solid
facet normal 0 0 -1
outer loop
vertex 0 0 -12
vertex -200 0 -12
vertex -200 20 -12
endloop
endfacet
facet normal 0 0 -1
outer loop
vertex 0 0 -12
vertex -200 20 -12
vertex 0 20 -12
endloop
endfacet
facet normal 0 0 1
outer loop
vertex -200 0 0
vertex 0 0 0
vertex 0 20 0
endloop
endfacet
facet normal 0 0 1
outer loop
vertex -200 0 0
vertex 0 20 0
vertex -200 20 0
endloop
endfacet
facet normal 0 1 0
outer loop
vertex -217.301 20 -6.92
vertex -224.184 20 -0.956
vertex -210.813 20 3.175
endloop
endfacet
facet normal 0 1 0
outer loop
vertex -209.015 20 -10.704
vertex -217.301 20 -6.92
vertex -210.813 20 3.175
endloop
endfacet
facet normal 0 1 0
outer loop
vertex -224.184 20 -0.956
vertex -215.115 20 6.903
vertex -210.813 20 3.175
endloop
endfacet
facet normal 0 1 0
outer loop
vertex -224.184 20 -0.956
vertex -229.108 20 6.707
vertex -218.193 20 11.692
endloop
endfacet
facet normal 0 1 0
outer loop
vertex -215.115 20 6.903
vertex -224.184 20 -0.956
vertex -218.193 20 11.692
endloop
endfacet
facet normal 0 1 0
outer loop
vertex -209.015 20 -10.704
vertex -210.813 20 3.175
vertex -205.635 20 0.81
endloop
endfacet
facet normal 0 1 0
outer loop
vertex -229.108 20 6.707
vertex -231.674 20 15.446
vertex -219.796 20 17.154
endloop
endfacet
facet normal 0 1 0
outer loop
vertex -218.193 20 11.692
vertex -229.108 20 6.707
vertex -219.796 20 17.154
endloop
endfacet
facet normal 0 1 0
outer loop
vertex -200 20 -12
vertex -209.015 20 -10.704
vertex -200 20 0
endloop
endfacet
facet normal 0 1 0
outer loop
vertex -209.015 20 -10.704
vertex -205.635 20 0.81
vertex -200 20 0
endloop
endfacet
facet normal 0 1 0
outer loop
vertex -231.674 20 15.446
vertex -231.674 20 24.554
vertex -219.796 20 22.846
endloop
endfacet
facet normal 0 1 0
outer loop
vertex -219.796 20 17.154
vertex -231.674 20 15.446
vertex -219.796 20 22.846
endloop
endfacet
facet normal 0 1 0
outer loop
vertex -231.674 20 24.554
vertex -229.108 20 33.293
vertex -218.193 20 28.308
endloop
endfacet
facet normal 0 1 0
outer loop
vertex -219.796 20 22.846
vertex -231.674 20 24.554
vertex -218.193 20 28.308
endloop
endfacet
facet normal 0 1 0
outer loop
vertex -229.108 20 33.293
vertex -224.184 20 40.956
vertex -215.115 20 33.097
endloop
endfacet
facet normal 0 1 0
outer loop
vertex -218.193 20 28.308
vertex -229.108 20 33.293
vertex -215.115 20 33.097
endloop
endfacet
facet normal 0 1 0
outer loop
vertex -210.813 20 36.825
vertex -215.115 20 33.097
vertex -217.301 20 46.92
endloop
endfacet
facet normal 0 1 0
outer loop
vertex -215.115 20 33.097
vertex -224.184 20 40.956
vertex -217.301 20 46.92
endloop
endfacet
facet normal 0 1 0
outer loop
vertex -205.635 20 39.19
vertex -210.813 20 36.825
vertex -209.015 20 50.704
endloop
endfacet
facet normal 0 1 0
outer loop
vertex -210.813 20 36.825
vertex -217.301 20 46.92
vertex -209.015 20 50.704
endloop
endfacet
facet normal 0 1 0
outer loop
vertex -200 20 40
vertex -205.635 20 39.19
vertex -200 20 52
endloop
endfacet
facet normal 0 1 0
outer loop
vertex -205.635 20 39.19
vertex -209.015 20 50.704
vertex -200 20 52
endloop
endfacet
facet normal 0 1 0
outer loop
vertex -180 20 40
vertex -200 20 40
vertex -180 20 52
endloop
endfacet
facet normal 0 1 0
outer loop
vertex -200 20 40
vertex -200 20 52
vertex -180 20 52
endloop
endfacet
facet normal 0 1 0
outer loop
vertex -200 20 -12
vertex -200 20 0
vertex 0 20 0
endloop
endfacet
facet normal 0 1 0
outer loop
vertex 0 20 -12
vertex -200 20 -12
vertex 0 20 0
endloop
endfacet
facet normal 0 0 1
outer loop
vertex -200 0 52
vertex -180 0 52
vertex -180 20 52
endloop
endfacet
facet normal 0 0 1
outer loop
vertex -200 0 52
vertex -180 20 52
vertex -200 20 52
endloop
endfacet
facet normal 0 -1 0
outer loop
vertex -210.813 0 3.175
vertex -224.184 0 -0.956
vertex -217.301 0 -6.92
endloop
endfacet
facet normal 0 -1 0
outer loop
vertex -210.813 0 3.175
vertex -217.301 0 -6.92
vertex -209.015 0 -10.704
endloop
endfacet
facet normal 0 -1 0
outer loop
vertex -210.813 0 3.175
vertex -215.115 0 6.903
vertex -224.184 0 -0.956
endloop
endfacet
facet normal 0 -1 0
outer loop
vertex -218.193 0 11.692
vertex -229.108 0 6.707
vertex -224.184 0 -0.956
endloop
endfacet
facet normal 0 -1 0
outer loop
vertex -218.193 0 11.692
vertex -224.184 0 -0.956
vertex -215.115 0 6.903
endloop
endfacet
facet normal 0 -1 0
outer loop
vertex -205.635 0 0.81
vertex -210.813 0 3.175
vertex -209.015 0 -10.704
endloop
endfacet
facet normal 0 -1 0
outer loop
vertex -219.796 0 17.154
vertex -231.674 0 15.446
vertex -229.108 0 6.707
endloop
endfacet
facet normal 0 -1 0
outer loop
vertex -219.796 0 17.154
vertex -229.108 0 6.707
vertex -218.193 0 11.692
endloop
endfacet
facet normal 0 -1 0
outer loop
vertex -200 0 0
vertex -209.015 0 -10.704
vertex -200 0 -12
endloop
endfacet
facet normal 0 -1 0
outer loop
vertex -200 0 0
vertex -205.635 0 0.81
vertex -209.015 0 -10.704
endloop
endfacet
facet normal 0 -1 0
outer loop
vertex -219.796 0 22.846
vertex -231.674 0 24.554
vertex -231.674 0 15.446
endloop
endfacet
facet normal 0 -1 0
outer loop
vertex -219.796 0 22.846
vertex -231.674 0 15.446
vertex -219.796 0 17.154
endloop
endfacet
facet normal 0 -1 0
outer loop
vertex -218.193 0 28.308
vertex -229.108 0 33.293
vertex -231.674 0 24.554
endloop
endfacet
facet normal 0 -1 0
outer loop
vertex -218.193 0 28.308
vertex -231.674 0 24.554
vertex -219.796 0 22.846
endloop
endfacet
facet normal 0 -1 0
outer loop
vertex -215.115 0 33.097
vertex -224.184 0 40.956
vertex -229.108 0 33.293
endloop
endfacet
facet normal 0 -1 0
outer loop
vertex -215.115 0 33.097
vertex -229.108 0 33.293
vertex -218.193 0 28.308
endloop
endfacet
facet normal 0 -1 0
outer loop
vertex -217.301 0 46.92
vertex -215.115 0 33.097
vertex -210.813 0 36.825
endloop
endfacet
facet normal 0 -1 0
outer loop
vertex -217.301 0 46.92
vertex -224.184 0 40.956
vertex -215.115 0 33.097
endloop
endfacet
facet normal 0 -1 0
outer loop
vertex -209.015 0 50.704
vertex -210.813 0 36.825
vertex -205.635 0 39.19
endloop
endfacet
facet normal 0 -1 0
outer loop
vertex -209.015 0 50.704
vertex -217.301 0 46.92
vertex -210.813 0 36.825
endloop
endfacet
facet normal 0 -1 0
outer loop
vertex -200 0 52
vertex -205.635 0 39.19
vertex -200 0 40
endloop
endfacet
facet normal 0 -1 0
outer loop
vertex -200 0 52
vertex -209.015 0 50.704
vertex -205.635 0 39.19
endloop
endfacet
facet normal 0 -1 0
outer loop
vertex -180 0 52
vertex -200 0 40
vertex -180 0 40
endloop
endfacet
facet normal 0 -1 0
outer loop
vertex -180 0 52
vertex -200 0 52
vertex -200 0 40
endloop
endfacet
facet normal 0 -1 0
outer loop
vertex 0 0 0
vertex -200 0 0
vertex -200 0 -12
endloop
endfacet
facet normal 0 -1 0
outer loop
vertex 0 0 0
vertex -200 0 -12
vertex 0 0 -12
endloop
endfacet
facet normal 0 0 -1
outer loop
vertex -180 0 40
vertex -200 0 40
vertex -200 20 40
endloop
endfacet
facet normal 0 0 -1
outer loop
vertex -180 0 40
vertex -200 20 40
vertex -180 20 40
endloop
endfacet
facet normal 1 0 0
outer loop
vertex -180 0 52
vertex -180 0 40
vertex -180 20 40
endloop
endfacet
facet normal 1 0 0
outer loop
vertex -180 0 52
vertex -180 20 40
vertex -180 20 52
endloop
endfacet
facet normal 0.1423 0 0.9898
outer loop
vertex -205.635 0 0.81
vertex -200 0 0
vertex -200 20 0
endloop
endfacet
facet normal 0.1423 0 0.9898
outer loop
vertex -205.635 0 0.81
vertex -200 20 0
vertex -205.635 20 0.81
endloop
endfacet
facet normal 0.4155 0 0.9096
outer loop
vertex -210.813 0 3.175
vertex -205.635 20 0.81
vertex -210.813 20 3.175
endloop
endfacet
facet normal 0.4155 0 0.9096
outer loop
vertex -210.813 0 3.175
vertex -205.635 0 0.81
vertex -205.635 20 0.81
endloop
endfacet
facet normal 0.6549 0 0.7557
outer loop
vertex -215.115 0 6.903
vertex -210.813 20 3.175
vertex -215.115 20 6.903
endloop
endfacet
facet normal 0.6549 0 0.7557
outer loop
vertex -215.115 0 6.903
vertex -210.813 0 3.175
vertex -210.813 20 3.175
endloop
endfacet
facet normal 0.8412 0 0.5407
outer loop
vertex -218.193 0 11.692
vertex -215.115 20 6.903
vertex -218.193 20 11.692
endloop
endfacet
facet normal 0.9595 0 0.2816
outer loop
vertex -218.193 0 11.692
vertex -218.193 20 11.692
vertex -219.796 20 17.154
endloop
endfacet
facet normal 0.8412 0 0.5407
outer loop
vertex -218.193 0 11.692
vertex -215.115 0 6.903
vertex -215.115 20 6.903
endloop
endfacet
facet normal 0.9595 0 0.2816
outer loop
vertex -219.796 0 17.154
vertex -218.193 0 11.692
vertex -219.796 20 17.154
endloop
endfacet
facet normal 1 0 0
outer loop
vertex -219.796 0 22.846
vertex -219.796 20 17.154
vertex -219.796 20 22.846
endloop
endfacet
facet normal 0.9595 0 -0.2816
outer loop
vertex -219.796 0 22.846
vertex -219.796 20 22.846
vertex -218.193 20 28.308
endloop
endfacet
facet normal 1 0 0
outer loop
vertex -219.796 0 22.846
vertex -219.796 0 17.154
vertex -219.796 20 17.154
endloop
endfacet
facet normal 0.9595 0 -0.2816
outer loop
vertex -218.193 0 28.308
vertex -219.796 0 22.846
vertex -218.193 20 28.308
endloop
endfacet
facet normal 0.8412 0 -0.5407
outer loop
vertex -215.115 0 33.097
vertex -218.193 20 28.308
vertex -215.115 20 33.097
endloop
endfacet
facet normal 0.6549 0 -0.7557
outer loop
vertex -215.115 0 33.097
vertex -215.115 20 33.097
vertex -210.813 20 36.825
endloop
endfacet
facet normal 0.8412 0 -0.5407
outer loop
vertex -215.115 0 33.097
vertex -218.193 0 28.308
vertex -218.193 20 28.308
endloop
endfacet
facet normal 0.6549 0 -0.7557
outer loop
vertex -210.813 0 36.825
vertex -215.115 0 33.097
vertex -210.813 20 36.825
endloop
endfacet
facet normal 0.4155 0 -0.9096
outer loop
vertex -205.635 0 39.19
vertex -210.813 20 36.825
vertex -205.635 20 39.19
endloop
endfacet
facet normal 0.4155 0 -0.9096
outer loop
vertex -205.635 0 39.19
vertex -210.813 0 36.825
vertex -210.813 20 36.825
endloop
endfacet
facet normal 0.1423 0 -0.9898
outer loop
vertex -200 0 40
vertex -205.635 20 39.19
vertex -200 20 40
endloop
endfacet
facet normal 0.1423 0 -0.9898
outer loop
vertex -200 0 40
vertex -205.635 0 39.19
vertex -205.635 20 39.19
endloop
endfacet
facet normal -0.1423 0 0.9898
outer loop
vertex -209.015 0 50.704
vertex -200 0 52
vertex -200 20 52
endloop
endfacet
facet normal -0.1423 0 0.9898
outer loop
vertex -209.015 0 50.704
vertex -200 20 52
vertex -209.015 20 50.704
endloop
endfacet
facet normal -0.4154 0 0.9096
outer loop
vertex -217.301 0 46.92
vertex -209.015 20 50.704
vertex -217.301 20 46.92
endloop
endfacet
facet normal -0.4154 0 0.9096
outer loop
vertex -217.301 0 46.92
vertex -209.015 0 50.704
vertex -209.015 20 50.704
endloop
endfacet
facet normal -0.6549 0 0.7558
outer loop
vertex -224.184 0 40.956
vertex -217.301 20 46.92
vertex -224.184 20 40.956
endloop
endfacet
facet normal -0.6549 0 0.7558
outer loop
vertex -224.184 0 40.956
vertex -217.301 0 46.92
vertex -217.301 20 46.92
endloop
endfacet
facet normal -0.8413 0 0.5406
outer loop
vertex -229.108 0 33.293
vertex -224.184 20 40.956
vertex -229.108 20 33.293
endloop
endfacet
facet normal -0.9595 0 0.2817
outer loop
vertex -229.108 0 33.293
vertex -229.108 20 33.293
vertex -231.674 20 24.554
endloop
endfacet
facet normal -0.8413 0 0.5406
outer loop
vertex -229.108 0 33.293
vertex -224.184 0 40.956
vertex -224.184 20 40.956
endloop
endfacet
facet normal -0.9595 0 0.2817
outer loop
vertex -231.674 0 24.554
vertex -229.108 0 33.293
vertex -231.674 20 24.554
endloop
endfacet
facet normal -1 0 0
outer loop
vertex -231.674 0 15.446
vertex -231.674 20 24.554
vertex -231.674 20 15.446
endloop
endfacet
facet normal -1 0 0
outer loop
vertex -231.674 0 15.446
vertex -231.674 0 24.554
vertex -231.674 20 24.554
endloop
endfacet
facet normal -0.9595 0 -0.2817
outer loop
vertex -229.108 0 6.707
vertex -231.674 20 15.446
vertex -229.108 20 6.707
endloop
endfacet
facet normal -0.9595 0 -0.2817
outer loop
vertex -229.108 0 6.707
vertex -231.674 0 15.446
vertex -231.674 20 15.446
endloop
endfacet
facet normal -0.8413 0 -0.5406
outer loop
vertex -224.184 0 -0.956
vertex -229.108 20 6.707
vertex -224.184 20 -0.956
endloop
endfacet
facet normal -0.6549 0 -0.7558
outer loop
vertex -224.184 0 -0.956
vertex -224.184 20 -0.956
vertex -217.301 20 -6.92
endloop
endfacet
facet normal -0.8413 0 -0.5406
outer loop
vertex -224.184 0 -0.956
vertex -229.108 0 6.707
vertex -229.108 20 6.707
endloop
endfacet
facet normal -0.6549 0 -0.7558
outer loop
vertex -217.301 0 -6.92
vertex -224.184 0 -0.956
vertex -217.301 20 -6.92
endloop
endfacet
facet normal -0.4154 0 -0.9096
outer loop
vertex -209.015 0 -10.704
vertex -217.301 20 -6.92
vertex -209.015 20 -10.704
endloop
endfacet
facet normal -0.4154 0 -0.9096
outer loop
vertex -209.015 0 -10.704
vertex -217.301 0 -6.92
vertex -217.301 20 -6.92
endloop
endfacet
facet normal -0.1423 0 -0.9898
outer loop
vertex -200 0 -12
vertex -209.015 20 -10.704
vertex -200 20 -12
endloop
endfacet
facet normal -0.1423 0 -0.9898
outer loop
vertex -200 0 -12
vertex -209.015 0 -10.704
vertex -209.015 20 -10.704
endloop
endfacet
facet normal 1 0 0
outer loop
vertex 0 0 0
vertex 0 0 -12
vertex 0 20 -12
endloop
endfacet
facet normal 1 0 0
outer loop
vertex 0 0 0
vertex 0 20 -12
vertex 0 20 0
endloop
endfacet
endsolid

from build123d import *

# Parameters (mm, degrees)
F1_DEPTH = 20


with BuildPart() as f1:
    # F0 (on Front) → F1 (new body)
    with BuildSketch(Plane.XZ):
        with BuildLine():
            Line((0, -12), (0, 0))
            Line((0, 0), (-200, 0))
            ThreePointArc((-200, 0), (-220, 20), (-200, 40))
            Line((-200, 40), (-180, 40))
            Line((-180, 40), (-180, 52))
            Line((-180, 52), (-200, 52))
            ThreePointArc((-200, 52), (-232, 20), (-200, -12))
            Line((-200, -12), (0, -12))
        make_face()
    extrude(amount=-F1_DEPTH)


solid = f1.part
